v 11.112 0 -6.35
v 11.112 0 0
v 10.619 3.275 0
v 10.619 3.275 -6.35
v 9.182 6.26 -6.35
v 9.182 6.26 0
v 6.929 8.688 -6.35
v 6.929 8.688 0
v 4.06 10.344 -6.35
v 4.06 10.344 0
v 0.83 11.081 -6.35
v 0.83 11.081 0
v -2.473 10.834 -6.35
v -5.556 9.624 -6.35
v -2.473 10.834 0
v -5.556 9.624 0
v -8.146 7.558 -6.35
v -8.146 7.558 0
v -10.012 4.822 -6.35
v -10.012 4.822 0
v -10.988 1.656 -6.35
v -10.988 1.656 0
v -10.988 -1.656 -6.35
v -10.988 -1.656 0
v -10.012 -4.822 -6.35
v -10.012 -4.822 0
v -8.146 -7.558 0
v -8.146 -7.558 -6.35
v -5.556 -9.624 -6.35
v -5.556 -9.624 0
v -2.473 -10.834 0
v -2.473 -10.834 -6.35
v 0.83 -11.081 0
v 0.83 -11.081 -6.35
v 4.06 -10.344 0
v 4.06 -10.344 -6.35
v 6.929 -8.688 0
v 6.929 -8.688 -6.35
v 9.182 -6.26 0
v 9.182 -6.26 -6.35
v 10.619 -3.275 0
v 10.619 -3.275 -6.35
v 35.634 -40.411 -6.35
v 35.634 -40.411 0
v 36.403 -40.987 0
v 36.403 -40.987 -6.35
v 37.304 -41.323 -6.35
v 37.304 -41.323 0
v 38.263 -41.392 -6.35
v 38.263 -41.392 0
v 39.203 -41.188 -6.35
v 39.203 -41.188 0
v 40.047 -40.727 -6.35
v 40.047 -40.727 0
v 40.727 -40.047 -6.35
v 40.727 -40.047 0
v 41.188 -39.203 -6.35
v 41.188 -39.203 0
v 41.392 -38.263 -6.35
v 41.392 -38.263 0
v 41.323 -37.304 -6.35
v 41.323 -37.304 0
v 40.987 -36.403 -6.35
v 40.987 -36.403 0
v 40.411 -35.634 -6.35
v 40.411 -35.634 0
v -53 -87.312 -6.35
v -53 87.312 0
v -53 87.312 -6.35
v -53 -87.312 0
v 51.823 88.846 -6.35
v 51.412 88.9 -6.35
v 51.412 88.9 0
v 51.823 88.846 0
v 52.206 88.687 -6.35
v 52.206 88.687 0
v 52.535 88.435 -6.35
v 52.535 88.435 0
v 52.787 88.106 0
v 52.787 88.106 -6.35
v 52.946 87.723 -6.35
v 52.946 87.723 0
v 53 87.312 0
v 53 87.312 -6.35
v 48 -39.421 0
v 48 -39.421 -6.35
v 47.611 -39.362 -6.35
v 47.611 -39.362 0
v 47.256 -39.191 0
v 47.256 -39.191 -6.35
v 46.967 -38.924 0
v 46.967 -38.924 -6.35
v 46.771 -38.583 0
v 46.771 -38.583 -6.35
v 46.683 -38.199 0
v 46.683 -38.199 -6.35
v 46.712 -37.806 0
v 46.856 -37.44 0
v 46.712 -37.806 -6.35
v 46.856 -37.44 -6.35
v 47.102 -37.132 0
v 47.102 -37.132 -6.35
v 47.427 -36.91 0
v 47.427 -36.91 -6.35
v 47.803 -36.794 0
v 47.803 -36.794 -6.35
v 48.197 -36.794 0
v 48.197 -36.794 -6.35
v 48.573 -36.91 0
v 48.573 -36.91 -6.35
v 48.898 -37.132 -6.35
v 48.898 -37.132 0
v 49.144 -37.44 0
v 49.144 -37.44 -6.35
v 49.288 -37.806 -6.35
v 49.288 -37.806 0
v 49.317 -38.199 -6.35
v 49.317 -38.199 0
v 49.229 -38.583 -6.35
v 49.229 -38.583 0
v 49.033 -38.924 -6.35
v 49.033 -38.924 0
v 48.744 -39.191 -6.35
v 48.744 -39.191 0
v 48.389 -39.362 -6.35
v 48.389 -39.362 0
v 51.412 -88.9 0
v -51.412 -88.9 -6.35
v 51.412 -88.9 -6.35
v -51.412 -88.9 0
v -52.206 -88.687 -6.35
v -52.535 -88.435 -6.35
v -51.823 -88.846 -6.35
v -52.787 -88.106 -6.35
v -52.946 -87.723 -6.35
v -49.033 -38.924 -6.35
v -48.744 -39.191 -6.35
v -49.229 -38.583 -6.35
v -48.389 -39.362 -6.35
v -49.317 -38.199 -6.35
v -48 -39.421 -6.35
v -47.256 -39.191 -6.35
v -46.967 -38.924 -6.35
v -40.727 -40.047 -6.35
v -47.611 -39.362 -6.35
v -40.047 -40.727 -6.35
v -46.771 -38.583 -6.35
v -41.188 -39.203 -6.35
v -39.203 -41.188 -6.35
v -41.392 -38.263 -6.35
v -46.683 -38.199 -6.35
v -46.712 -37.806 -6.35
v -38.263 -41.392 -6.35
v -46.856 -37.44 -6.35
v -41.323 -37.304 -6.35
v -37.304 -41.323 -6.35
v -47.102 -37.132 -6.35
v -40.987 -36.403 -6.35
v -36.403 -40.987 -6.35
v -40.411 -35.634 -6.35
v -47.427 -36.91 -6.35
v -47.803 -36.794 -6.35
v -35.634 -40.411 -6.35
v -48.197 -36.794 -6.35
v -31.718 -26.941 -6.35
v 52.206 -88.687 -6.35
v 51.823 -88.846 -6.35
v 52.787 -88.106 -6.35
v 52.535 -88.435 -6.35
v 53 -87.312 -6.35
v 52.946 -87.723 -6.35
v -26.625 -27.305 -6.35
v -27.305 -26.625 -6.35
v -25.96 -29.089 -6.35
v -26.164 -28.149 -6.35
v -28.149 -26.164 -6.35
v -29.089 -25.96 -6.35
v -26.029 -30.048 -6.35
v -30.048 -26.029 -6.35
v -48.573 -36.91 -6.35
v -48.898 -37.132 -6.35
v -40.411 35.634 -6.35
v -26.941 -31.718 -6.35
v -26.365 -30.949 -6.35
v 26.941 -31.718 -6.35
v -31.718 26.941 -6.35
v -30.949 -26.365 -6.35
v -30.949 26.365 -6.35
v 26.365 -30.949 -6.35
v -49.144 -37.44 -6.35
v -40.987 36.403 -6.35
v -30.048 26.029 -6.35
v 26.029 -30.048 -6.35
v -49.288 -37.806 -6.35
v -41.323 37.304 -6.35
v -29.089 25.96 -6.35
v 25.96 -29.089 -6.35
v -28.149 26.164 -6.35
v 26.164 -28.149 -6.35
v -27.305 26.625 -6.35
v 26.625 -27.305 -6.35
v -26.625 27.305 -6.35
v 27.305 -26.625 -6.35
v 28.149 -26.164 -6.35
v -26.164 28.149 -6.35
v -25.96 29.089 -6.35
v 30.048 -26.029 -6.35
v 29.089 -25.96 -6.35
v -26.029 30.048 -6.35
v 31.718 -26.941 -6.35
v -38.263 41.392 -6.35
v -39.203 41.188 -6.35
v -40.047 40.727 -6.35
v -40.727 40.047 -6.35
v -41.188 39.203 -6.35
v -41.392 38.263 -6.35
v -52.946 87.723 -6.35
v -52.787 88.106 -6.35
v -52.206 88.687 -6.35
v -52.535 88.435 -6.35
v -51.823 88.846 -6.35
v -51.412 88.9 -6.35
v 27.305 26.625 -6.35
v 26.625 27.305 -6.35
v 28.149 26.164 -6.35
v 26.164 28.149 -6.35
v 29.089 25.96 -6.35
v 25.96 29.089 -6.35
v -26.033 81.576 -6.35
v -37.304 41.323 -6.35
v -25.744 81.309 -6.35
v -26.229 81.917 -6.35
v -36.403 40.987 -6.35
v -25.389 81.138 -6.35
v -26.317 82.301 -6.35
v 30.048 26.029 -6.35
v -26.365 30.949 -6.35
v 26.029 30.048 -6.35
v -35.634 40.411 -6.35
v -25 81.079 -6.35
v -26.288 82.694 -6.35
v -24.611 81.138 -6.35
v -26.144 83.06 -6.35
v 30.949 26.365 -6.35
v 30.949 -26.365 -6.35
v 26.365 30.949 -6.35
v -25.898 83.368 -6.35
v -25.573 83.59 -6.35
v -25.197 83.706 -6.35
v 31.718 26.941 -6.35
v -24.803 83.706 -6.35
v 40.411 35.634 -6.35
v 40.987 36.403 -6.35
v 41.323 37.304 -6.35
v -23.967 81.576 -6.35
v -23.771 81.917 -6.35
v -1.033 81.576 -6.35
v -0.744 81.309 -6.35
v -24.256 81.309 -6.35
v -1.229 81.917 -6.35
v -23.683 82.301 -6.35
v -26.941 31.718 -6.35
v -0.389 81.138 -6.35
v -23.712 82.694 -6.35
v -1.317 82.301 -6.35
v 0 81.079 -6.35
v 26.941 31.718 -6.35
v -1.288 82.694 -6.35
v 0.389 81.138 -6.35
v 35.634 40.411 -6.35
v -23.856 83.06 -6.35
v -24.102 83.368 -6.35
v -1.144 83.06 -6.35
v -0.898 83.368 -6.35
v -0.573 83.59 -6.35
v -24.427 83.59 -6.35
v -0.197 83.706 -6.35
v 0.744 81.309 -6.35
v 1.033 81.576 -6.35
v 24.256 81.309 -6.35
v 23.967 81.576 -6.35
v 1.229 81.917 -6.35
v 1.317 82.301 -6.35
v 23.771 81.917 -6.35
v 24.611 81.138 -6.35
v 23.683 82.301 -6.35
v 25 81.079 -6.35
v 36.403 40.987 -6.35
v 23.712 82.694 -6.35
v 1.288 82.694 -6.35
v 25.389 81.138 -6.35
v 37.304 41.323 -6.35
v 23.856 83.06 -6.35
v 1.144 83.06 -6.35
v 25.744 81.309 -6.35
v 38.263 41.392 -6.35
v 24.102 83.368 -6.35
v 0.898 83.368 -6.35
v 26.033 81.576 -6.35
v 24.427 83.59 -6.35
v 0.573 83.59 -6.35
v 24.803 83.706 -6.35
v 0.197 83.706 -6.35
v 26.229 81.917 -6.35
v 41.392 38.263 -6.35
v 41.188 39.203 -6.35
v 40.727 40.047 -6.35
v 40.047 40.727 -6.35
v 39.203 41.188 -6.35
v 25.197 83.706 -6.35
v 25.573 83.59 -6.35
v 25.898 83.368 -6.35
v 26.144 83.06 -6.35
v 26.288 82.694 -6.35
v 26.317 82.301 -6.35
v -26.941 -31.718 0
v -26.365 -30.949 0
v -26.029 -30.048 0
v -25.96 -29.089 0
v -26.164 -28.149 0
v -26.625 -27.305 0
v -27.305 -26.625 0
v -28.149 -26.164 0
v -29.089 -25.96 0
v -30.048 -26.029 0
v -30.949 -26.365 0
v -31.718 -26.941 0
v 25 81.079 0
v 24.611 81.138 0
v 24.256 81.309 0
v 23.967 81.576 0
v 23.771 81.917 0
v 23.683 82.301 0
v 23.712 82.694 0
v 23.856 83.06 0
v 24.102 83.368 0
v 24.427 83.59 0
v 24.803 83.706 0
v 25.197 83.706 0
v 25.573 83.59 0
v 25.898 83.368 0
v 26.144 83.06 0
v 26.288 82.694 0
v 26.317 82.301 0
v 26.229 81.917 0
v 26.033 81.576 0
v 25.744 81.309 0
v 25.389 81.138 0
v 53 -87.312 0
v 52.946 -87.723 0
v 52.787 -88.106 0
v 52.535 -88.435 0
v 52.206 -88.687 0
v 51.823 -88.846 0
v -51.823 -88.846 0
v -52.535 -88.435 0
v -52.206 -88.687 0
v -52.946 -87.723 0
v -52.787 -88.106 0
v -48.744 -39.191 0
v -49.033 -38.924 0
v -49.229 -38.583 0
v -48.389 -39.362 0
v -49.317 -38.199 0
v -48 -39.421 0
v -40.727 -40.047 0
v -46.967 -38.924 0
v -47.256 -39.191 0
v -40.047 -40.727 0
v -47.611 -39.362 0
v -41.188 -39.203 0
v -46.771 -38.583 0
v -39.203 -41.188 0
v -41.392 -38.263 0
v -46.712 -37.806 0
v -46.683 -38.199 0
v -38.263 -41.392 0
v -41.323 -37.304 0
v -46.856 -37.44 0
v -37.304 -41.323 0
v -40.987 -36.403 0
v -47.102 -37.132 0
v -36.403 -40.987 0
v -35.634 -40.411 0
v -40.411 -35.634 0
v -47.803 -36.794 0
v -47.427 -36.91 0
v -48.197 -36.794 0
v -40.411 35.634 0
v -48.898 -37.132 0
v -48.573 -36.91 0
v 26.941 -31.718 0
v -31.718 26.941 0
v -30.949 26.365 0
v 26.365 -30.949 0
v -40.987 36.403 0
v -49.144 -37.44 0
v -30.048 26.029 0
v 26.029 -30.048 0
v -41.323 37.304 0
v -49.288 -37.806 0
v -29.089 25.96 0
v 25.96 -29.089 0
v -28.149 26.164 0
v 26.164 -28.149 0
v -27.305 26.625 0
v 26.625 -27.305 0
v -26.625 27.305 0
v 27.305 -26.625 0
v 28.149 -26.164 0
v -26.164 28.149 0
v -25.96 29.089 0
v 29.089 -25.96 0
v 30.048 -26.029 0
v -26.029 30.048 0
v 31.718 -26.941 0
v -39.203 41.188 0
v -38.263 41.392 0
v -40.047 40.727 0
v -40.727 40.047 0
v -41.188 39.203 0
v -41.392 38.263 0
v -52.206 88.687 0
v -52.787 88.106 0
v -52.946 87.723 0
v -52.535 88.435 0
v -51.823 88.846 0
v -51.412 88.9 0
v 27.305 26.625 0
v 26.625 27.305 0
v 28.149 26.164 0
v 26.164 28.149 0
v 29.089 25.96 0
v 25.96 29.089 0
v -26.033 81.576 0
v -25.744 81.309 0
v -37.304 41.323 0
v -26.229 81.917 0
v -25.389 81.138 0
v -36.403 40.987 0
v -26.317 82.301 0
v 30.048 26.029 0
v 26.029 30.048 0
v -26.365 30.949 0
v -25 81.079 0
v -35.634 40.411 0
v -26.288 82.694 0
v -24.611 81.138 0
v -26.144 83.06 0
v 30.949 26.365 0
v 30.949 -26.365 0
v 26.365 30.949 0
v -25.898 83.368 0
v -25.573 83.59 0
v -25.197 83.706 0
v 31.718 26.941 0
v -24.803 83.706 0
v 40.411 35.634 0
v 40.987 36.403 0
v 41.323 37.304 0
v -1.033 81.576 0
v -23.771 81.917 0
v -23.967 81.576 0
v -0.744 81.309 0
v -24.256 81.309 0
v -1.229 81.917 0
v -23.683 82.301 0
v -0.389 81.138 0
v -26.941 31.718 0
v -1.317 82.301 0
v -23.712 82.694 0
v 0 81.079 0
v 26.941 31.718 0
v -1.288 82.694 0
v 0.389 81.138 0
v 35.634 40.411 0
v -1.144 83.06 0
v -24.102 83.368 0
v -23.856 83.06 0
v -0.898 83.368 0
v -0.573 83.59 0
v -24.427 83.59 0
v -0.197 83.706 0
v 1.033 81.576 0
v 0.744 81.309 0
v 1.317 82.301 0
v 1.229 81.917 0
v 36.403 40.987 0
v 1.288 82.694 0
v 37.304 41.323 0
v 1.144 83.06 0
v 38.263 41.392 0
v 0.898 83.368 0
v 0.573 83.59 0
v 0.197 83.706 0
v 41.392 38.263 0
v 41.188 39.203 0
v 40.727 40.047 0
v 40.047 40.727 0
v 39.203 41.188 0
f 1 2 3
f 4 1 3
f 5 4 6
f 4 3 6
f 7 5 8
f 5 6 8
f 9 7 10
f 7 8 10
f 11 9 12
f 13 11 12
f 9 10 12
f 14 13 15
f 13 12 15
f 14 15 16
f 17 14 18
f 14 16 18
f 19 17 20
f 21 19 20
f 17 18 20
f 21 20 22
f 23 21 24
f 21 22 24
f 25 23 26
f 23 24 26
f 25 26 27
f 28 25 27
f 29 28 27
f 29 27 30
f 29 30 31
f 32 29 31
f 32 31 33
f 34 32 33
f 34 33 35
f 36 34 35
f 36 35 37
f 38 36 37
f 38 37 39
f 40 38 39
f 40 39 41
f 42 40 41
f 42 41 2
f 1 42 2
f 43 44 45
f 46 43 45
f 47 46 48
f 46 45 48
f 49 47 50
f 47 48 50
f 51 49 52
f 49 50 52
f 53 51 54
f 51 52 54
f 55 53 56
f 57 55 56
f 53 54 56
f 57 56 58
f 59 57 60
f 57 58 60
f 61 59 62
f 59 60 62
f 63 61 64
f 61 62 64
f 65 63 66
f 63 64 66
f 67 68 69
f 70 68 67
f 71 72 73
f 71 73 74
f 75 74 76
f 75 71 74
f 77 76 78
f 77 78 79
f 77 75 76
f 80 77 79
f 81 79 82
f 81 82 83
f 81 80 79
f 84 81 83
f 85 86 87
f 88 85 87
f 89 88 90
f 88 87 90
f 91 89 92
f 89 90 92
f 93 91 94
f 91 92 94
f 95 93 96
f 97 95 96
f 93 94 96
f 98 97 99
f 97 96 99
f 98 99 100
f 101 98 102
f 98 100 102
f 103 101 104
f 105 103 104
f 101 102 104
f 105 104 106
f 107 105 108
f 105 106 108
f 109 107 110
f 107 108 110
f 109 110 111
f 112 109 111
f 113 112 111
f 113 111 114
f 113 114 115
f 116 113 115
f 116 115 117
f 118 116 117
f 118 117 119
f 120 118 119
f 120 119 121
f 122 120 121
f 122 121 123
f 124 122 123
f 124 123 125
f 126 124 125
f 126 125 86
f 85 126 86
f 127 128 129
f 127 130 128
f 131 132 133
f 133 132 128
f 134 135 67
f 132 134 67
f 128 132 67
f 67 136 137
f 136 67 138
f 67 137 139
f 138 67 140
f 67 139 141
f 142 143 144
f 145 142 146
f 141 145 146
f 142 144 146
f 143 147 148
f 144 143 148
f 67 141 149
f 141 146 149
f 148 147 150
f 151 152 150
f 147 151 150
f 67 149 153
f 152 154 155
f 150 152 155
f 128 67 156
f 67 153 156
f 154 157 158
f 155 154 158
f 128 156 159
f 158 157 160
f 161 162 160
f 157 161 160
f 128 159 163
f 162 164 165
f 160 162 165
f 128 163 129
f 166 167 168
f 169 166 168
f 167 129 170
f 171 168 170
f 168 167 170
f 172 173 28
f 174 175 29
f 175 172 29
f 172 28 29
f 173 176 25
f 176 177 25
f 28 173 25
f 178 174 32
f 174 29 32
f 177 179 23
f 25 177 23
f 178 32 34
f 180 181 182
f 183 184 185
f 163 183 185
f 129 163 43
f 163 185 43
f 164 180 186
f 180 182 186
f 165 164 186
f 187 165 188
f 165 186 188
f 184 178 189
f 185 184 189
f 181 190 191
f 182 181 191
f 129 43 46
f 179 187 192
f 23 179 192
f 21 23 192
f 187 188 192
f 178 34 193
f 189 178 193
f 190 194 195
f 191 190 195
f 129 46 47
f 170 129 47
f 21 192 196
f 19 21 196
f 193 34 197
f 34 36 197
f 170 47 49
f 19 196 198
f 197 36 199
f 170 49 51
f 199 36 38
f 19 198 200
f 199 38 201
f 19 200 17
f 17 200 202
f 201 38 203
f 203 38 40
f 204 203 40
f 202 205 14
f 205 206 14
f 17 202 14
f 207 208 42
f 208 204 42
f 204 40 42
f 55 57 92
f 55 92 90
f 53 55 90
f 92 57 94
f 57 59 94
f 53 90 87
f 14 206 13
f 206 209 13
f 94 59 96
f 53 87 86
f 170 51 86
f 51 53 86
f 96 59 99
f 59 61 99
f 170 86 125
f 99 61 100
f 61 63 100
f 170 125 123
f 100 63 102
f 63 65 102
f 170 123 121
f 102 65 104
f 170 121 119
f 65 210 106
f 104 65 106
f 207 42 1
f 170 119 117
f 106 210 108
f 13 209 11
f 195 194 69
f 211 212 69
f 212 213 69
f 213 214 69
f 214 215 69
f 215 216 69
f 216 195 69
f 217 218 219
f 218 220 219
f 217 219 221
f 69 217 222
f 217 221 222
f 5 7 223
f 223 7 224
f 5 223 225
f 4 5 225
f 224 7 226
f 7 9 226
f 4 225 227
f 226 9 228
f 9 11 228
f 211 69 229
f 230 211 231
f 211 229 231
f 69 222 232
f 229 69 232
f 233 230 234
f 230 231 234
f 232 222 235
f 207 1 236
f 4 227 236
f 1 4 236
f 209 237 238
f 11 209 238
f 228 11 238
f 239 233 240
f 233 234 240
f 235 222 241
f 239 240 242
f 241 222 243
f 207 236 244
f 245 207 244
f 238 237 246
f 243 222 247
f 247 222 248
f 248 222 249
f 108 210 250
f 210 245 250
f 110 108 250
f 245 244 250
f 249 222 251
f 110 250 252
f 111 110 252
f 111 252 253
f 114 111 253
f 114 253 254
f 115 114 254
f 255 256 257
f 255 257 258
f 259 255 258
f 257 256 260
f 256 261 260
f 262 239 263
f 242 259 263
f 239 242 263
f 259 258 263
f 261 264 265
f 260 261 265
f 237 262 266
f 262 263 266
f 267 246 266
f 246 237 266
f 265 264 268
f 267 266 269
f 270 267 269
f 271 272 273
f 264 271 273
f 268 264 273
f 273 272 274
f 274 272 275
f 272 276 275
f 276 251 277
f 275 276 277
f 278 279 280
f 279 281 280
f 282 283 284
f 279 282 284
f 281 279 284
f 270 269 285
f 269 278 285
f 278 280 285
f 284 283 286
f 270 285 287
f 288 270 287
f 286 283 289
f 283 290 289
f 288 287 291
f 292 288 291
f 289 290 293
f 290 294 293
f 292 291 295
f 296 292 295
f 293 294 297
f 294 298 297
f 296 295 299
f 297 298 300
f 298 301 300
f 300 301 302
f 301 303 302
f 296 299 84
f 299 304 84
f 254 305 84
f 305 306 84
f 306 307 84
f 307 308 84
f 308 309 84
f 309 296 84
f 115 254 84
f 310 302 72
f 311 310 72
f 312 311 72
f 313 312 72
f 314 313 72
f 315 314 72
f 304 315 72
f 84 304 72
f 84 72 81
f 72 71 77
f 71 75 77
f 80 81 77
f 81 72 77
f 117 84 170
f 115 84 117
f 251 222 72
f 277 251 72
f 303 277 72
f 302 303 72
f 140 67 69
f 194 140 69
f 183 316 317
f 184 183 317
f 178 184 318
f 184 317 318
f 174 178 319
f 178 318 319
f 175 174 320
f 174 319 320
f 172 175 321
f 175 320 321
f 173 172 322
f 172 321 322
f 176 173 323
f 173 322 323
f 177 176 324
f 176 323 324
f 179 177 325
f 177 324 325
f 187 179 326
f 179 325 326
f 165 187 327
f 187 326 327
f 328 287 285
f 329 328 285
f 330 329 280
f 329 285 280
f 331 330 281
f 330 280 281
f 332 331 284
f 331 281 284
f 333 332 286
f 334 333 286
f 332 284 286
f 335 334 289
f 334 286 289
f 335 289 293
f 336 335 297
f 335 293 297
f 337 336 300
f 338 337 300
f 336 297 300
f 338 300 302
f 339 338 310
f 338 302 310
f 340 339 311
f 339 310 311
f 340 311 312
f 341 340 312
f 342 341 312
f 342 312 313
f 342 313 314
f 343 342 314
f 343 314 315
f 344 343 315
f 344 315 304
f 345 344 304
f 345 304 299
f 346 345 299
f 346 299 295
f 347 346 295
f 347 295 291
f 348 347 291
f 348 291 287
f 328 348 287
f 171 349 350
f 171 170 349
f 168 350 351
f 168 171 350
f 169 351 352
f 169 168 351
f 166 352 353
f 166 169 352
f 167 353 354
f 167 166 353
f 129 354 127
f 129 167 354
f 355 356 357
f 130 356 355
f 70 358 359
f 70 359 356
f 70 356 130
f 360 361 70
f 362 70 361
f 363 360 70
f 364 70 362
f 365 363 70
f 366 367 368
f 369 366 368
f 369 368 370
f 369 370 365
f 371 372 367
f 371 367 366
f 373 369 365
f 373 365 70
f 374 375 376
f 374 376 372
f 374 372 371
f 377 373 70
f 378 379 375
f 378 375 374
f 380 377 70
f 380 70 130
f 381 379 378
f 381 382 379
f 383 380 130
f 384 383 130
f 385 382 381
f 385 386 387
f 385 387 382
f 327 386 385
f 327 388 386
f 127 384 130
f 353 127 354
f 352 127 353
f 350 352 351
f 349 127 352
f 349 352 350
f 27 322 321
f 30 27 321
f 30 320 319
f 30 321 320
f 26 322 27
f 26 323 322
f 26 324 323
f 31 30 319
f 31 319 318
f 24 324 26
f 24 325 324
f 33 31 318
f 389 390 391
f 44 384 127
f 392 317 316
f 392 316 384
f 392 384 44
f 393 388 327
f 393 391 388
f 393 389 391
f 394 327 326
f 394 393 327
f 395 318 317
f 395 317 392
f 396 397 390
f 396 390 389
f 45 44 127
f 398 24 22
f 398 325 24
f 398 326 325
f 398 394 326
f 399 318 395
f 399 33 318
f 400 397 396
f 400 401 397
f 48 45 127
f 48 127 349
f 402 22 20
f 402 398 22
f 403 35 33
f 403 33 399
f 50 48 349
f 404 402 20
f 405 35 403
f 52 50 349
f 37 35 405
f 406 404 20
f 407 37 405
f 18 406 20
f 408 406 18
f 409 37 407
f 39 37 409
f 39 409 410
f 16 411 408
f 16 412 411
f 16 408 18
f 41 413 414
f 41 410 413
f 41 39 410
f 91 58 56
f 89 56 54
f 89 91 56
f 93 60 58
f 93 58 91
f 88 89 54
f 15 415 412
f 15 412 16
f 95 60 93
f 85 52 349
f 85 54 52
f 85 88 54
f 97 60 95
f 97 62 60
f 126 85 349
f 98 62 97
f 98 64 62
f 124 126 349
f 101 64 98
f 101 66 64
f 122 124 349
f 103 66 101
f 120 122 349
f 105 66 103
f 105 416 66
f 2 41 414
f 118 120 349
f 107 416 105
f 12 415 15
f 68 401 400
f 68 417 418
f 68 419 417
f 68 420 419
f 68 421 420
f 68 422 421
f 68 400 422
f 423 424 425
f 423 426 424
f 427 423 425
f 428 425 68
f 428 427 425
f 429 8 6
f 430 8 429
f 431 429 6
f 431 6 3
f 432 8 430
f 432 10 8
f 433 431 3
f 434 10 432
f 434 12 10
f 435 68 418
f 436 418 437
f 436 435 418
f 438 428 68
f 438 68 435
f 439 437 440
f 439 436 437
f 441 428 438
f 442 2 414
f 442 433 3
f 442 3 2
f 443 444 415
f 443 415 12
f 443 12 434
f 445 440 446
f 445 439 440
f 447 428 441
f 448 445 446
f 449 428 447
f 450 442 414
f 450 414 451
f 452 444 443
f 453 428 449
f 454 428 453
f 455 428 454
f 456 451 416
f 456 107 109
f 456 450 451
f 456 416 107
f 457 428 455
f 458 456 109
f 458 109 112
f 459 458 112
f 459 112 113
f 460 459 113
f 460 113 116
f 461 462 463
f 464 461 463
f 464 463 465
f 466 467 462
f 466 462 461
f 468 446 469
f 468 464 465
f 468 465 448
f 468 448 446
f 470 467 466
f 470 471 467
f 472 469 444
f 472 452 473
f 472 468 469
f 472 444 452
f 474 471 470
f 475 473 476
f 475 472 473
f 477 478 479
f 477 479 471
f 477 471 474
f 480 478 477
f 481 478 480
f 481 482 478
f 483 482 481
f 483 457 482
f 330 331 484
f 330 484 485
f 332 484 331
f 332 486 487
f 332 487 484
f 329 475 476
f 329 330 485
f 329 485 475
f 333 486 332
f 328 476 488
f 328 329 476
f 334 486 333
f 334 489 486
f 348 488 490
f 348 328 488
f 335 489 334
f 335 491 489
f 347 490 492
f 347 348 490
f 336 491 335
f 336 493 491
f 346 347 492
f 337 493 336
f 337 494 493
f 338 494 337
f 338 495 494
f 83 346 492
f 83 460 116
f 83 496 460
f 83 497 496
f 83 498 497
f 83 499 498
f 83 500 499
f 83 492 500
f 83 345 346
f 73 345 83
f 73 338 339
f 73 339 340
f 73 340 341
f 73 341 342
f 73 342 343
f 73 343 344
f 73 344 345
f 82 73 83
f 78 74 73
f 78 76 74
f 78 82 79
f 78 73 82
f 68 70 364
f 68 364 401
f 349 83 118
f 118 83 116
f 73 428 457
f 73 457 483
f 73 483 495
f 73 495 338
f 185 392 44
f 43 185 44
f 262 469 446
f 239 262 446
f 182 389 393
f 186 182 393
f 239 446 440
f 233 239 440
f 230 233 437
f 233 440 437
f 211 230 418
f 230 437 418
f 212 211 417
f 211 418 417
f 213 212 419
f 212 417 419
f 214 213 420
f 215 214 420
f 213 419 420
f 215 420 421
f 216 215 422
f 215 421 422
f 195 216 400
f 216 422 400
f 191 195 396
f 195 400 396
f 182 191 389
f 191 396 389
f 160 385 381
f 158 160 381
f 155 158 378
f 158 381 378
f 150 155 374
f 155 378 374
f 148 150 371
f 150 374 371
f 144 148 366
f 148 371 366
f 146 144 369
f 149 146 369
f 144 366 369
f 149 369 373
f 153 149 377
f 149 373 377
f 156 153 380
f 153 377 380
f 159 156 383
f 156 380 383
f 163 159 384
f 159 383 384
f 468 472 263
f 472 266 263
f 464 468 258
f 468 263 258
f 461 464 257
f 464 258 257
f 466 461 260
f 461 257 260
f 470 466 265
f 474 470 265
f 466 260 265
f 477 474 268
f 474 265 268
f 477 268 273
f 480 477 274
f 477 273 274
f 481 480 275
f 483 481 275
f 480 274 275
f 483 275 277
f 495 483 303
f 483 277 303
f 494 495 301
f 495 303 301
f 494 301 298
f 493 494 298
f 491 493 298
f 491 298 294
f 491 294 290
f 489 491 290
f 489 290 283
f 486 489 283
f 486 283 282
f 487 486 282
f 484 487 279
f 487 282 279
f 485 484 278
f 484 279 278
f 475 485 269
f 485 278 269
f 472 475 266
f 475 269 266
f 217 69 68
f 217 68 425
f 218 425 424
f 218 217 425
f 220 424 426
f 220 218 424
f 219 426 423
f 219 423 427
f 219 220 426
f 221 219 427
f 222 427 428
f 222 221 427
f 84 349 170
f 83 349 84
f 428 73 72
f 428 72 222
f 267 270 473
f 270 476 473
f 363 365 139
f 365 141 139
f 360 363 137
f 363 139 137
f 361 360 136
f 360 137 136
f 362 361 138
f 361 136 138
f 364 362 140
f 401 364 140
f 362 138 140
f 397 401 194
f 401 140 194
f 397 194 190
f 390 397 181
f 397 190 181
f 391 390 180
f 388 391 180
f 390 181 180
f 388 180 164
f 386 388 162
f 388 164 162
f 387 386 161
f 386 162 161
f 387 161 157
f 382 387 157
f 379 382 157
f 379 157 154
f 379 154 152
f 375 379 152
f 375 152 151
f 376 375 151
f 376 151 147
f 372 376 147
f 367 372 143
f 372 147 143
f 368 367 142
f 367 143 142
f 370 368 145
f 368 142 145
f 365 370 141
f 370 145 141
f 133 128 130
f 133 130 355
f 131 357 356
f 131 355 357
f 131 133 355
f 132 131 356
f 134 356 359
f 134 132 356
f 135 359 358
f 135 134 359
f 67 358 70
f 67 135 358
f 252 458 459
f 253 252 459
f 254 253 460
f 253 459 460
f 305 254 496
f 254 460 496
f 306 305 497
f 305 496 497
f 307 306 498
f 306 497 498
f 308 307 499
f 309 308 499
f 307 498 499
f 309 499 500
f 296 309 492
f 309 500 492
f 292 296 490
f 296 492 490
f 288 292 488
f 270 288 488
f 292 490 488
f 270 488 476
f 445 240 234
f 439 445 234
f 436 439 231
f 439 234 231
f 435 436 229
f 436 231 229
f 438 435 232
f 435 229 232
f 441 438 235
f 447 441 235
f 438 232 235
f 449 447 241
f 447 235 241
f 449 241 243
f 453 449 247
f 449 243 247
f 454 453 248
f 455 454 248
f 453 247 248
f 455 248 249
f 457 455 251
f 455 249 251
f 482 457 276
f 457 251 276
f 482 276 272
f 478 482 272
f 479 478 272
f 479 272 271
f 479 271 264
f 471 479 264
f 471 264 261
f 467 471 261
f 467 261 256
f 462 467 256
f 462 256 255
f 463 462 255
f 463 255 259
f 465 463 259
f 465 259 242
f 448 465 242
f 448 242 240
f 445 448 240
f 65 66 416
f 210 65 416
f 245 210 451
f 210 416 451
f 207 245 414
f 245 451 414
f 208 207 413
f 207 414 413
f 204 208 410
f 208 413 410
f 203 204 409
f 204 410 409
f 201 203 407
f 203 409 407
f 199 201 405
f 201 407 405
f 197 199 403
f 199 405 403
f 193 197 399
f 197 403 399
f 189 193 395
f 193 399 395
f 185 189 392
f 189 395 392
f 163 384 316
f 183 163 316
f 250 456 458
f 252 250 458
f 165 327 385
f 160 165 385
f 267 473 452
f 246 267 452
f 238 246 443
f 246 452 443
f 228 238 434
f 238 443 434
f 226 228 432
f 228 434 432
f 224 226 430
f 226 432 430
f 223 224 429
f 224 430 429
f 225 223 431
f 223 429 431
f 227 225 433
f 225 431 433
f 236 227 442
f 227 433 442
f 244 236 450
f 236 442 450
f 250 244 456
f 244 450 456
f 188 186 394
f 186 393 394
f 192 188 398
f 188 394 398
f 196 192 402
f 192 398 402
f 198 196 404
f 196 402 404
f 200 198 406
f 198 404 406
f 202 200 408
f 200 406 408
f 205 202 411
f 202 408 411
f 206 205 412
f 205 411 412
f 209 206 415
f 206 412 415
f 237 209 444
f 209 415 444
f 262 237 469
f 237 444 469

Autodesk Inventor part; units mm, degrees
ref_plane "YZ Plane" through (0, 0, 0) normal (1, 0, 0) x (0, 1, 0)
ref_plane "XZ Plane" through (0, 0, 0) normal (0, 1, 0) x (-1, 0, 0)
ref_plane "XY Plane" through (0, 0, 0) normal (0, 0, 1) x (1, 0, 0)
sketch "Sketch2" plane through (0, 0, 0) normal (0, 0, 1) x (1, 0, 0)
  line L0 (-53, -88.9) -> (53, -88.9)
  line L1 (53, -88.9) -> (53, 88.9)
  line L2 (53, 88.9) -> (-53, 88.9)
  line L3 (-53, 88.9) -> (-53, -88.9)
  line L4 (-53, -88.9) -> (53, 88.9) construction
  line L5 (53, -88.9) -> (-53, 88.9) construction
  point P0 (0, 0)
  dimension "d0" = 106
  dimension "d1" = 177.8
extrude "Extrusion1" add sketch "Sketch2" against normal blind 6.35
sketch "Sketch5" plane through (0, 0, 0) normal (0, 0, 1) x (1, 0, 0)
  circle A0 centre (0, 0) radius 11.1125
  dimension "d26" = 22.225
extrude "CenterHole" cut sketch "Sketch5" against normal through all
sketch "Sketch6" plane through (0, 0, 0) normal (0, 0, 1) x (1, 0, 0)
  line L0 (-53, 88.9) -> (-53, -88.9) projected
  line L1 (53, -88.9) -> (53, 88.9) projected
  line L2 (-53, -88.9) -> (-53, 88.9) construction
  line L3 (-53, 82.4) -> (53, 82.4) construction
  line L4 (53, 88.9) -> (-53, 88.9) construction
  point P0 (0, 0)
  point P1 (0, 82.4)
  point P2 (123.3454, 23.3667)
  point P3 (-25, 82.4)
  point P4 (25, 82.4)
  dimension "d29" = 6.5
  dimension "d30" = 25
  dimension "d31" = 25
hole "TopThreeHoles" at (0, 82.4, 0) at (123.3454, 23.3667, 0) at (-25, 82.4, 0) at (25, 82.4, 0) direction (0, 0, -1) diameter 2.6416 end through all thread size "6-32 UNC" class "2B" standard "ANSI Unified Screw Threads"
sketch "Sketch7" plane through (0, 0, 0) normal (0, 0, 1) x (1, 0, 0)
  line L0 (53, -88.9) -> (53, 88.9) projected
  line L1 (-53, 88.9) -> (-53, -88.9) projected
  line L2 (-53, -38.1) -> (53, -38.1) construction
  line L3 (53, 88.9) -> (53, -88.9) projected
  line L4 (53, 88.9) -> (-53, 88.9) construction
  point P0 (0, 0)
  point P1 (-48, -38.1)
  point P2 (48, -38.1)
  dimension "d39" = 127
  dimension "d40" = 5
  dimension "d41" = 5
hole "BottomTwoHoles" at (-48, -38.1, 0) at (48, -38.1, 0) direction (0, 0, -1) diameter 2.6416 end through all thread size "6-32 UNC" class "2B" standard "ANSI Unified Screw Threads"
fillet "Fillet1" radius 1.5875 4 edges at (53, 88.9, -3.175) (-53, 88.9, -3.175) (53, -88.9, -3.175) (-53, -88.9, -3.175)
sketch "Sketch8" plane through (0, 0, 0) normal (0, 0, 1) x (1, 0, 0)
  line L0 (0, 0) -> (-53, 53) construction
  line L1 (-53, 87.3125) -> (-53, -87.3125) construction
  line L2 (-38.0224, 38.0224) -> (-29.3295, 29.3295) construction
  line L3 (-40.4112, 35.6337) -> (-31.7183, 26.9408)
  line L4 (-26.9408, 31.7183) -> (-35.6337, 40.4112)
  arc A0 (-35.6337, 40.4112) -> (-40.4112, 35.6337) centre (-38.0224, 38.0224) ccw
  arc A1 (-31.7183, 26.9408) -> (-26.9408, 31.7183) centre (-29.3295, 29.3295) ccw
  point P0 (-33.676, 33.676)
  dimension "d50" = 45
  dimension "d51" = 6.7564
  dimension "d53" = 19.05
  dimension "d59" = 3.3782
  dimension "d60" = 41.4782
extrude "SlotForScrews" cut sketch "Sketch8" against normal through all
pattern_circular "Circular Pattern1" count 4 over 360 about axis through (0, 0, -10) along (0, 0, 1) of "SlotForScrews"
properties part number "properySideGateGasket"
